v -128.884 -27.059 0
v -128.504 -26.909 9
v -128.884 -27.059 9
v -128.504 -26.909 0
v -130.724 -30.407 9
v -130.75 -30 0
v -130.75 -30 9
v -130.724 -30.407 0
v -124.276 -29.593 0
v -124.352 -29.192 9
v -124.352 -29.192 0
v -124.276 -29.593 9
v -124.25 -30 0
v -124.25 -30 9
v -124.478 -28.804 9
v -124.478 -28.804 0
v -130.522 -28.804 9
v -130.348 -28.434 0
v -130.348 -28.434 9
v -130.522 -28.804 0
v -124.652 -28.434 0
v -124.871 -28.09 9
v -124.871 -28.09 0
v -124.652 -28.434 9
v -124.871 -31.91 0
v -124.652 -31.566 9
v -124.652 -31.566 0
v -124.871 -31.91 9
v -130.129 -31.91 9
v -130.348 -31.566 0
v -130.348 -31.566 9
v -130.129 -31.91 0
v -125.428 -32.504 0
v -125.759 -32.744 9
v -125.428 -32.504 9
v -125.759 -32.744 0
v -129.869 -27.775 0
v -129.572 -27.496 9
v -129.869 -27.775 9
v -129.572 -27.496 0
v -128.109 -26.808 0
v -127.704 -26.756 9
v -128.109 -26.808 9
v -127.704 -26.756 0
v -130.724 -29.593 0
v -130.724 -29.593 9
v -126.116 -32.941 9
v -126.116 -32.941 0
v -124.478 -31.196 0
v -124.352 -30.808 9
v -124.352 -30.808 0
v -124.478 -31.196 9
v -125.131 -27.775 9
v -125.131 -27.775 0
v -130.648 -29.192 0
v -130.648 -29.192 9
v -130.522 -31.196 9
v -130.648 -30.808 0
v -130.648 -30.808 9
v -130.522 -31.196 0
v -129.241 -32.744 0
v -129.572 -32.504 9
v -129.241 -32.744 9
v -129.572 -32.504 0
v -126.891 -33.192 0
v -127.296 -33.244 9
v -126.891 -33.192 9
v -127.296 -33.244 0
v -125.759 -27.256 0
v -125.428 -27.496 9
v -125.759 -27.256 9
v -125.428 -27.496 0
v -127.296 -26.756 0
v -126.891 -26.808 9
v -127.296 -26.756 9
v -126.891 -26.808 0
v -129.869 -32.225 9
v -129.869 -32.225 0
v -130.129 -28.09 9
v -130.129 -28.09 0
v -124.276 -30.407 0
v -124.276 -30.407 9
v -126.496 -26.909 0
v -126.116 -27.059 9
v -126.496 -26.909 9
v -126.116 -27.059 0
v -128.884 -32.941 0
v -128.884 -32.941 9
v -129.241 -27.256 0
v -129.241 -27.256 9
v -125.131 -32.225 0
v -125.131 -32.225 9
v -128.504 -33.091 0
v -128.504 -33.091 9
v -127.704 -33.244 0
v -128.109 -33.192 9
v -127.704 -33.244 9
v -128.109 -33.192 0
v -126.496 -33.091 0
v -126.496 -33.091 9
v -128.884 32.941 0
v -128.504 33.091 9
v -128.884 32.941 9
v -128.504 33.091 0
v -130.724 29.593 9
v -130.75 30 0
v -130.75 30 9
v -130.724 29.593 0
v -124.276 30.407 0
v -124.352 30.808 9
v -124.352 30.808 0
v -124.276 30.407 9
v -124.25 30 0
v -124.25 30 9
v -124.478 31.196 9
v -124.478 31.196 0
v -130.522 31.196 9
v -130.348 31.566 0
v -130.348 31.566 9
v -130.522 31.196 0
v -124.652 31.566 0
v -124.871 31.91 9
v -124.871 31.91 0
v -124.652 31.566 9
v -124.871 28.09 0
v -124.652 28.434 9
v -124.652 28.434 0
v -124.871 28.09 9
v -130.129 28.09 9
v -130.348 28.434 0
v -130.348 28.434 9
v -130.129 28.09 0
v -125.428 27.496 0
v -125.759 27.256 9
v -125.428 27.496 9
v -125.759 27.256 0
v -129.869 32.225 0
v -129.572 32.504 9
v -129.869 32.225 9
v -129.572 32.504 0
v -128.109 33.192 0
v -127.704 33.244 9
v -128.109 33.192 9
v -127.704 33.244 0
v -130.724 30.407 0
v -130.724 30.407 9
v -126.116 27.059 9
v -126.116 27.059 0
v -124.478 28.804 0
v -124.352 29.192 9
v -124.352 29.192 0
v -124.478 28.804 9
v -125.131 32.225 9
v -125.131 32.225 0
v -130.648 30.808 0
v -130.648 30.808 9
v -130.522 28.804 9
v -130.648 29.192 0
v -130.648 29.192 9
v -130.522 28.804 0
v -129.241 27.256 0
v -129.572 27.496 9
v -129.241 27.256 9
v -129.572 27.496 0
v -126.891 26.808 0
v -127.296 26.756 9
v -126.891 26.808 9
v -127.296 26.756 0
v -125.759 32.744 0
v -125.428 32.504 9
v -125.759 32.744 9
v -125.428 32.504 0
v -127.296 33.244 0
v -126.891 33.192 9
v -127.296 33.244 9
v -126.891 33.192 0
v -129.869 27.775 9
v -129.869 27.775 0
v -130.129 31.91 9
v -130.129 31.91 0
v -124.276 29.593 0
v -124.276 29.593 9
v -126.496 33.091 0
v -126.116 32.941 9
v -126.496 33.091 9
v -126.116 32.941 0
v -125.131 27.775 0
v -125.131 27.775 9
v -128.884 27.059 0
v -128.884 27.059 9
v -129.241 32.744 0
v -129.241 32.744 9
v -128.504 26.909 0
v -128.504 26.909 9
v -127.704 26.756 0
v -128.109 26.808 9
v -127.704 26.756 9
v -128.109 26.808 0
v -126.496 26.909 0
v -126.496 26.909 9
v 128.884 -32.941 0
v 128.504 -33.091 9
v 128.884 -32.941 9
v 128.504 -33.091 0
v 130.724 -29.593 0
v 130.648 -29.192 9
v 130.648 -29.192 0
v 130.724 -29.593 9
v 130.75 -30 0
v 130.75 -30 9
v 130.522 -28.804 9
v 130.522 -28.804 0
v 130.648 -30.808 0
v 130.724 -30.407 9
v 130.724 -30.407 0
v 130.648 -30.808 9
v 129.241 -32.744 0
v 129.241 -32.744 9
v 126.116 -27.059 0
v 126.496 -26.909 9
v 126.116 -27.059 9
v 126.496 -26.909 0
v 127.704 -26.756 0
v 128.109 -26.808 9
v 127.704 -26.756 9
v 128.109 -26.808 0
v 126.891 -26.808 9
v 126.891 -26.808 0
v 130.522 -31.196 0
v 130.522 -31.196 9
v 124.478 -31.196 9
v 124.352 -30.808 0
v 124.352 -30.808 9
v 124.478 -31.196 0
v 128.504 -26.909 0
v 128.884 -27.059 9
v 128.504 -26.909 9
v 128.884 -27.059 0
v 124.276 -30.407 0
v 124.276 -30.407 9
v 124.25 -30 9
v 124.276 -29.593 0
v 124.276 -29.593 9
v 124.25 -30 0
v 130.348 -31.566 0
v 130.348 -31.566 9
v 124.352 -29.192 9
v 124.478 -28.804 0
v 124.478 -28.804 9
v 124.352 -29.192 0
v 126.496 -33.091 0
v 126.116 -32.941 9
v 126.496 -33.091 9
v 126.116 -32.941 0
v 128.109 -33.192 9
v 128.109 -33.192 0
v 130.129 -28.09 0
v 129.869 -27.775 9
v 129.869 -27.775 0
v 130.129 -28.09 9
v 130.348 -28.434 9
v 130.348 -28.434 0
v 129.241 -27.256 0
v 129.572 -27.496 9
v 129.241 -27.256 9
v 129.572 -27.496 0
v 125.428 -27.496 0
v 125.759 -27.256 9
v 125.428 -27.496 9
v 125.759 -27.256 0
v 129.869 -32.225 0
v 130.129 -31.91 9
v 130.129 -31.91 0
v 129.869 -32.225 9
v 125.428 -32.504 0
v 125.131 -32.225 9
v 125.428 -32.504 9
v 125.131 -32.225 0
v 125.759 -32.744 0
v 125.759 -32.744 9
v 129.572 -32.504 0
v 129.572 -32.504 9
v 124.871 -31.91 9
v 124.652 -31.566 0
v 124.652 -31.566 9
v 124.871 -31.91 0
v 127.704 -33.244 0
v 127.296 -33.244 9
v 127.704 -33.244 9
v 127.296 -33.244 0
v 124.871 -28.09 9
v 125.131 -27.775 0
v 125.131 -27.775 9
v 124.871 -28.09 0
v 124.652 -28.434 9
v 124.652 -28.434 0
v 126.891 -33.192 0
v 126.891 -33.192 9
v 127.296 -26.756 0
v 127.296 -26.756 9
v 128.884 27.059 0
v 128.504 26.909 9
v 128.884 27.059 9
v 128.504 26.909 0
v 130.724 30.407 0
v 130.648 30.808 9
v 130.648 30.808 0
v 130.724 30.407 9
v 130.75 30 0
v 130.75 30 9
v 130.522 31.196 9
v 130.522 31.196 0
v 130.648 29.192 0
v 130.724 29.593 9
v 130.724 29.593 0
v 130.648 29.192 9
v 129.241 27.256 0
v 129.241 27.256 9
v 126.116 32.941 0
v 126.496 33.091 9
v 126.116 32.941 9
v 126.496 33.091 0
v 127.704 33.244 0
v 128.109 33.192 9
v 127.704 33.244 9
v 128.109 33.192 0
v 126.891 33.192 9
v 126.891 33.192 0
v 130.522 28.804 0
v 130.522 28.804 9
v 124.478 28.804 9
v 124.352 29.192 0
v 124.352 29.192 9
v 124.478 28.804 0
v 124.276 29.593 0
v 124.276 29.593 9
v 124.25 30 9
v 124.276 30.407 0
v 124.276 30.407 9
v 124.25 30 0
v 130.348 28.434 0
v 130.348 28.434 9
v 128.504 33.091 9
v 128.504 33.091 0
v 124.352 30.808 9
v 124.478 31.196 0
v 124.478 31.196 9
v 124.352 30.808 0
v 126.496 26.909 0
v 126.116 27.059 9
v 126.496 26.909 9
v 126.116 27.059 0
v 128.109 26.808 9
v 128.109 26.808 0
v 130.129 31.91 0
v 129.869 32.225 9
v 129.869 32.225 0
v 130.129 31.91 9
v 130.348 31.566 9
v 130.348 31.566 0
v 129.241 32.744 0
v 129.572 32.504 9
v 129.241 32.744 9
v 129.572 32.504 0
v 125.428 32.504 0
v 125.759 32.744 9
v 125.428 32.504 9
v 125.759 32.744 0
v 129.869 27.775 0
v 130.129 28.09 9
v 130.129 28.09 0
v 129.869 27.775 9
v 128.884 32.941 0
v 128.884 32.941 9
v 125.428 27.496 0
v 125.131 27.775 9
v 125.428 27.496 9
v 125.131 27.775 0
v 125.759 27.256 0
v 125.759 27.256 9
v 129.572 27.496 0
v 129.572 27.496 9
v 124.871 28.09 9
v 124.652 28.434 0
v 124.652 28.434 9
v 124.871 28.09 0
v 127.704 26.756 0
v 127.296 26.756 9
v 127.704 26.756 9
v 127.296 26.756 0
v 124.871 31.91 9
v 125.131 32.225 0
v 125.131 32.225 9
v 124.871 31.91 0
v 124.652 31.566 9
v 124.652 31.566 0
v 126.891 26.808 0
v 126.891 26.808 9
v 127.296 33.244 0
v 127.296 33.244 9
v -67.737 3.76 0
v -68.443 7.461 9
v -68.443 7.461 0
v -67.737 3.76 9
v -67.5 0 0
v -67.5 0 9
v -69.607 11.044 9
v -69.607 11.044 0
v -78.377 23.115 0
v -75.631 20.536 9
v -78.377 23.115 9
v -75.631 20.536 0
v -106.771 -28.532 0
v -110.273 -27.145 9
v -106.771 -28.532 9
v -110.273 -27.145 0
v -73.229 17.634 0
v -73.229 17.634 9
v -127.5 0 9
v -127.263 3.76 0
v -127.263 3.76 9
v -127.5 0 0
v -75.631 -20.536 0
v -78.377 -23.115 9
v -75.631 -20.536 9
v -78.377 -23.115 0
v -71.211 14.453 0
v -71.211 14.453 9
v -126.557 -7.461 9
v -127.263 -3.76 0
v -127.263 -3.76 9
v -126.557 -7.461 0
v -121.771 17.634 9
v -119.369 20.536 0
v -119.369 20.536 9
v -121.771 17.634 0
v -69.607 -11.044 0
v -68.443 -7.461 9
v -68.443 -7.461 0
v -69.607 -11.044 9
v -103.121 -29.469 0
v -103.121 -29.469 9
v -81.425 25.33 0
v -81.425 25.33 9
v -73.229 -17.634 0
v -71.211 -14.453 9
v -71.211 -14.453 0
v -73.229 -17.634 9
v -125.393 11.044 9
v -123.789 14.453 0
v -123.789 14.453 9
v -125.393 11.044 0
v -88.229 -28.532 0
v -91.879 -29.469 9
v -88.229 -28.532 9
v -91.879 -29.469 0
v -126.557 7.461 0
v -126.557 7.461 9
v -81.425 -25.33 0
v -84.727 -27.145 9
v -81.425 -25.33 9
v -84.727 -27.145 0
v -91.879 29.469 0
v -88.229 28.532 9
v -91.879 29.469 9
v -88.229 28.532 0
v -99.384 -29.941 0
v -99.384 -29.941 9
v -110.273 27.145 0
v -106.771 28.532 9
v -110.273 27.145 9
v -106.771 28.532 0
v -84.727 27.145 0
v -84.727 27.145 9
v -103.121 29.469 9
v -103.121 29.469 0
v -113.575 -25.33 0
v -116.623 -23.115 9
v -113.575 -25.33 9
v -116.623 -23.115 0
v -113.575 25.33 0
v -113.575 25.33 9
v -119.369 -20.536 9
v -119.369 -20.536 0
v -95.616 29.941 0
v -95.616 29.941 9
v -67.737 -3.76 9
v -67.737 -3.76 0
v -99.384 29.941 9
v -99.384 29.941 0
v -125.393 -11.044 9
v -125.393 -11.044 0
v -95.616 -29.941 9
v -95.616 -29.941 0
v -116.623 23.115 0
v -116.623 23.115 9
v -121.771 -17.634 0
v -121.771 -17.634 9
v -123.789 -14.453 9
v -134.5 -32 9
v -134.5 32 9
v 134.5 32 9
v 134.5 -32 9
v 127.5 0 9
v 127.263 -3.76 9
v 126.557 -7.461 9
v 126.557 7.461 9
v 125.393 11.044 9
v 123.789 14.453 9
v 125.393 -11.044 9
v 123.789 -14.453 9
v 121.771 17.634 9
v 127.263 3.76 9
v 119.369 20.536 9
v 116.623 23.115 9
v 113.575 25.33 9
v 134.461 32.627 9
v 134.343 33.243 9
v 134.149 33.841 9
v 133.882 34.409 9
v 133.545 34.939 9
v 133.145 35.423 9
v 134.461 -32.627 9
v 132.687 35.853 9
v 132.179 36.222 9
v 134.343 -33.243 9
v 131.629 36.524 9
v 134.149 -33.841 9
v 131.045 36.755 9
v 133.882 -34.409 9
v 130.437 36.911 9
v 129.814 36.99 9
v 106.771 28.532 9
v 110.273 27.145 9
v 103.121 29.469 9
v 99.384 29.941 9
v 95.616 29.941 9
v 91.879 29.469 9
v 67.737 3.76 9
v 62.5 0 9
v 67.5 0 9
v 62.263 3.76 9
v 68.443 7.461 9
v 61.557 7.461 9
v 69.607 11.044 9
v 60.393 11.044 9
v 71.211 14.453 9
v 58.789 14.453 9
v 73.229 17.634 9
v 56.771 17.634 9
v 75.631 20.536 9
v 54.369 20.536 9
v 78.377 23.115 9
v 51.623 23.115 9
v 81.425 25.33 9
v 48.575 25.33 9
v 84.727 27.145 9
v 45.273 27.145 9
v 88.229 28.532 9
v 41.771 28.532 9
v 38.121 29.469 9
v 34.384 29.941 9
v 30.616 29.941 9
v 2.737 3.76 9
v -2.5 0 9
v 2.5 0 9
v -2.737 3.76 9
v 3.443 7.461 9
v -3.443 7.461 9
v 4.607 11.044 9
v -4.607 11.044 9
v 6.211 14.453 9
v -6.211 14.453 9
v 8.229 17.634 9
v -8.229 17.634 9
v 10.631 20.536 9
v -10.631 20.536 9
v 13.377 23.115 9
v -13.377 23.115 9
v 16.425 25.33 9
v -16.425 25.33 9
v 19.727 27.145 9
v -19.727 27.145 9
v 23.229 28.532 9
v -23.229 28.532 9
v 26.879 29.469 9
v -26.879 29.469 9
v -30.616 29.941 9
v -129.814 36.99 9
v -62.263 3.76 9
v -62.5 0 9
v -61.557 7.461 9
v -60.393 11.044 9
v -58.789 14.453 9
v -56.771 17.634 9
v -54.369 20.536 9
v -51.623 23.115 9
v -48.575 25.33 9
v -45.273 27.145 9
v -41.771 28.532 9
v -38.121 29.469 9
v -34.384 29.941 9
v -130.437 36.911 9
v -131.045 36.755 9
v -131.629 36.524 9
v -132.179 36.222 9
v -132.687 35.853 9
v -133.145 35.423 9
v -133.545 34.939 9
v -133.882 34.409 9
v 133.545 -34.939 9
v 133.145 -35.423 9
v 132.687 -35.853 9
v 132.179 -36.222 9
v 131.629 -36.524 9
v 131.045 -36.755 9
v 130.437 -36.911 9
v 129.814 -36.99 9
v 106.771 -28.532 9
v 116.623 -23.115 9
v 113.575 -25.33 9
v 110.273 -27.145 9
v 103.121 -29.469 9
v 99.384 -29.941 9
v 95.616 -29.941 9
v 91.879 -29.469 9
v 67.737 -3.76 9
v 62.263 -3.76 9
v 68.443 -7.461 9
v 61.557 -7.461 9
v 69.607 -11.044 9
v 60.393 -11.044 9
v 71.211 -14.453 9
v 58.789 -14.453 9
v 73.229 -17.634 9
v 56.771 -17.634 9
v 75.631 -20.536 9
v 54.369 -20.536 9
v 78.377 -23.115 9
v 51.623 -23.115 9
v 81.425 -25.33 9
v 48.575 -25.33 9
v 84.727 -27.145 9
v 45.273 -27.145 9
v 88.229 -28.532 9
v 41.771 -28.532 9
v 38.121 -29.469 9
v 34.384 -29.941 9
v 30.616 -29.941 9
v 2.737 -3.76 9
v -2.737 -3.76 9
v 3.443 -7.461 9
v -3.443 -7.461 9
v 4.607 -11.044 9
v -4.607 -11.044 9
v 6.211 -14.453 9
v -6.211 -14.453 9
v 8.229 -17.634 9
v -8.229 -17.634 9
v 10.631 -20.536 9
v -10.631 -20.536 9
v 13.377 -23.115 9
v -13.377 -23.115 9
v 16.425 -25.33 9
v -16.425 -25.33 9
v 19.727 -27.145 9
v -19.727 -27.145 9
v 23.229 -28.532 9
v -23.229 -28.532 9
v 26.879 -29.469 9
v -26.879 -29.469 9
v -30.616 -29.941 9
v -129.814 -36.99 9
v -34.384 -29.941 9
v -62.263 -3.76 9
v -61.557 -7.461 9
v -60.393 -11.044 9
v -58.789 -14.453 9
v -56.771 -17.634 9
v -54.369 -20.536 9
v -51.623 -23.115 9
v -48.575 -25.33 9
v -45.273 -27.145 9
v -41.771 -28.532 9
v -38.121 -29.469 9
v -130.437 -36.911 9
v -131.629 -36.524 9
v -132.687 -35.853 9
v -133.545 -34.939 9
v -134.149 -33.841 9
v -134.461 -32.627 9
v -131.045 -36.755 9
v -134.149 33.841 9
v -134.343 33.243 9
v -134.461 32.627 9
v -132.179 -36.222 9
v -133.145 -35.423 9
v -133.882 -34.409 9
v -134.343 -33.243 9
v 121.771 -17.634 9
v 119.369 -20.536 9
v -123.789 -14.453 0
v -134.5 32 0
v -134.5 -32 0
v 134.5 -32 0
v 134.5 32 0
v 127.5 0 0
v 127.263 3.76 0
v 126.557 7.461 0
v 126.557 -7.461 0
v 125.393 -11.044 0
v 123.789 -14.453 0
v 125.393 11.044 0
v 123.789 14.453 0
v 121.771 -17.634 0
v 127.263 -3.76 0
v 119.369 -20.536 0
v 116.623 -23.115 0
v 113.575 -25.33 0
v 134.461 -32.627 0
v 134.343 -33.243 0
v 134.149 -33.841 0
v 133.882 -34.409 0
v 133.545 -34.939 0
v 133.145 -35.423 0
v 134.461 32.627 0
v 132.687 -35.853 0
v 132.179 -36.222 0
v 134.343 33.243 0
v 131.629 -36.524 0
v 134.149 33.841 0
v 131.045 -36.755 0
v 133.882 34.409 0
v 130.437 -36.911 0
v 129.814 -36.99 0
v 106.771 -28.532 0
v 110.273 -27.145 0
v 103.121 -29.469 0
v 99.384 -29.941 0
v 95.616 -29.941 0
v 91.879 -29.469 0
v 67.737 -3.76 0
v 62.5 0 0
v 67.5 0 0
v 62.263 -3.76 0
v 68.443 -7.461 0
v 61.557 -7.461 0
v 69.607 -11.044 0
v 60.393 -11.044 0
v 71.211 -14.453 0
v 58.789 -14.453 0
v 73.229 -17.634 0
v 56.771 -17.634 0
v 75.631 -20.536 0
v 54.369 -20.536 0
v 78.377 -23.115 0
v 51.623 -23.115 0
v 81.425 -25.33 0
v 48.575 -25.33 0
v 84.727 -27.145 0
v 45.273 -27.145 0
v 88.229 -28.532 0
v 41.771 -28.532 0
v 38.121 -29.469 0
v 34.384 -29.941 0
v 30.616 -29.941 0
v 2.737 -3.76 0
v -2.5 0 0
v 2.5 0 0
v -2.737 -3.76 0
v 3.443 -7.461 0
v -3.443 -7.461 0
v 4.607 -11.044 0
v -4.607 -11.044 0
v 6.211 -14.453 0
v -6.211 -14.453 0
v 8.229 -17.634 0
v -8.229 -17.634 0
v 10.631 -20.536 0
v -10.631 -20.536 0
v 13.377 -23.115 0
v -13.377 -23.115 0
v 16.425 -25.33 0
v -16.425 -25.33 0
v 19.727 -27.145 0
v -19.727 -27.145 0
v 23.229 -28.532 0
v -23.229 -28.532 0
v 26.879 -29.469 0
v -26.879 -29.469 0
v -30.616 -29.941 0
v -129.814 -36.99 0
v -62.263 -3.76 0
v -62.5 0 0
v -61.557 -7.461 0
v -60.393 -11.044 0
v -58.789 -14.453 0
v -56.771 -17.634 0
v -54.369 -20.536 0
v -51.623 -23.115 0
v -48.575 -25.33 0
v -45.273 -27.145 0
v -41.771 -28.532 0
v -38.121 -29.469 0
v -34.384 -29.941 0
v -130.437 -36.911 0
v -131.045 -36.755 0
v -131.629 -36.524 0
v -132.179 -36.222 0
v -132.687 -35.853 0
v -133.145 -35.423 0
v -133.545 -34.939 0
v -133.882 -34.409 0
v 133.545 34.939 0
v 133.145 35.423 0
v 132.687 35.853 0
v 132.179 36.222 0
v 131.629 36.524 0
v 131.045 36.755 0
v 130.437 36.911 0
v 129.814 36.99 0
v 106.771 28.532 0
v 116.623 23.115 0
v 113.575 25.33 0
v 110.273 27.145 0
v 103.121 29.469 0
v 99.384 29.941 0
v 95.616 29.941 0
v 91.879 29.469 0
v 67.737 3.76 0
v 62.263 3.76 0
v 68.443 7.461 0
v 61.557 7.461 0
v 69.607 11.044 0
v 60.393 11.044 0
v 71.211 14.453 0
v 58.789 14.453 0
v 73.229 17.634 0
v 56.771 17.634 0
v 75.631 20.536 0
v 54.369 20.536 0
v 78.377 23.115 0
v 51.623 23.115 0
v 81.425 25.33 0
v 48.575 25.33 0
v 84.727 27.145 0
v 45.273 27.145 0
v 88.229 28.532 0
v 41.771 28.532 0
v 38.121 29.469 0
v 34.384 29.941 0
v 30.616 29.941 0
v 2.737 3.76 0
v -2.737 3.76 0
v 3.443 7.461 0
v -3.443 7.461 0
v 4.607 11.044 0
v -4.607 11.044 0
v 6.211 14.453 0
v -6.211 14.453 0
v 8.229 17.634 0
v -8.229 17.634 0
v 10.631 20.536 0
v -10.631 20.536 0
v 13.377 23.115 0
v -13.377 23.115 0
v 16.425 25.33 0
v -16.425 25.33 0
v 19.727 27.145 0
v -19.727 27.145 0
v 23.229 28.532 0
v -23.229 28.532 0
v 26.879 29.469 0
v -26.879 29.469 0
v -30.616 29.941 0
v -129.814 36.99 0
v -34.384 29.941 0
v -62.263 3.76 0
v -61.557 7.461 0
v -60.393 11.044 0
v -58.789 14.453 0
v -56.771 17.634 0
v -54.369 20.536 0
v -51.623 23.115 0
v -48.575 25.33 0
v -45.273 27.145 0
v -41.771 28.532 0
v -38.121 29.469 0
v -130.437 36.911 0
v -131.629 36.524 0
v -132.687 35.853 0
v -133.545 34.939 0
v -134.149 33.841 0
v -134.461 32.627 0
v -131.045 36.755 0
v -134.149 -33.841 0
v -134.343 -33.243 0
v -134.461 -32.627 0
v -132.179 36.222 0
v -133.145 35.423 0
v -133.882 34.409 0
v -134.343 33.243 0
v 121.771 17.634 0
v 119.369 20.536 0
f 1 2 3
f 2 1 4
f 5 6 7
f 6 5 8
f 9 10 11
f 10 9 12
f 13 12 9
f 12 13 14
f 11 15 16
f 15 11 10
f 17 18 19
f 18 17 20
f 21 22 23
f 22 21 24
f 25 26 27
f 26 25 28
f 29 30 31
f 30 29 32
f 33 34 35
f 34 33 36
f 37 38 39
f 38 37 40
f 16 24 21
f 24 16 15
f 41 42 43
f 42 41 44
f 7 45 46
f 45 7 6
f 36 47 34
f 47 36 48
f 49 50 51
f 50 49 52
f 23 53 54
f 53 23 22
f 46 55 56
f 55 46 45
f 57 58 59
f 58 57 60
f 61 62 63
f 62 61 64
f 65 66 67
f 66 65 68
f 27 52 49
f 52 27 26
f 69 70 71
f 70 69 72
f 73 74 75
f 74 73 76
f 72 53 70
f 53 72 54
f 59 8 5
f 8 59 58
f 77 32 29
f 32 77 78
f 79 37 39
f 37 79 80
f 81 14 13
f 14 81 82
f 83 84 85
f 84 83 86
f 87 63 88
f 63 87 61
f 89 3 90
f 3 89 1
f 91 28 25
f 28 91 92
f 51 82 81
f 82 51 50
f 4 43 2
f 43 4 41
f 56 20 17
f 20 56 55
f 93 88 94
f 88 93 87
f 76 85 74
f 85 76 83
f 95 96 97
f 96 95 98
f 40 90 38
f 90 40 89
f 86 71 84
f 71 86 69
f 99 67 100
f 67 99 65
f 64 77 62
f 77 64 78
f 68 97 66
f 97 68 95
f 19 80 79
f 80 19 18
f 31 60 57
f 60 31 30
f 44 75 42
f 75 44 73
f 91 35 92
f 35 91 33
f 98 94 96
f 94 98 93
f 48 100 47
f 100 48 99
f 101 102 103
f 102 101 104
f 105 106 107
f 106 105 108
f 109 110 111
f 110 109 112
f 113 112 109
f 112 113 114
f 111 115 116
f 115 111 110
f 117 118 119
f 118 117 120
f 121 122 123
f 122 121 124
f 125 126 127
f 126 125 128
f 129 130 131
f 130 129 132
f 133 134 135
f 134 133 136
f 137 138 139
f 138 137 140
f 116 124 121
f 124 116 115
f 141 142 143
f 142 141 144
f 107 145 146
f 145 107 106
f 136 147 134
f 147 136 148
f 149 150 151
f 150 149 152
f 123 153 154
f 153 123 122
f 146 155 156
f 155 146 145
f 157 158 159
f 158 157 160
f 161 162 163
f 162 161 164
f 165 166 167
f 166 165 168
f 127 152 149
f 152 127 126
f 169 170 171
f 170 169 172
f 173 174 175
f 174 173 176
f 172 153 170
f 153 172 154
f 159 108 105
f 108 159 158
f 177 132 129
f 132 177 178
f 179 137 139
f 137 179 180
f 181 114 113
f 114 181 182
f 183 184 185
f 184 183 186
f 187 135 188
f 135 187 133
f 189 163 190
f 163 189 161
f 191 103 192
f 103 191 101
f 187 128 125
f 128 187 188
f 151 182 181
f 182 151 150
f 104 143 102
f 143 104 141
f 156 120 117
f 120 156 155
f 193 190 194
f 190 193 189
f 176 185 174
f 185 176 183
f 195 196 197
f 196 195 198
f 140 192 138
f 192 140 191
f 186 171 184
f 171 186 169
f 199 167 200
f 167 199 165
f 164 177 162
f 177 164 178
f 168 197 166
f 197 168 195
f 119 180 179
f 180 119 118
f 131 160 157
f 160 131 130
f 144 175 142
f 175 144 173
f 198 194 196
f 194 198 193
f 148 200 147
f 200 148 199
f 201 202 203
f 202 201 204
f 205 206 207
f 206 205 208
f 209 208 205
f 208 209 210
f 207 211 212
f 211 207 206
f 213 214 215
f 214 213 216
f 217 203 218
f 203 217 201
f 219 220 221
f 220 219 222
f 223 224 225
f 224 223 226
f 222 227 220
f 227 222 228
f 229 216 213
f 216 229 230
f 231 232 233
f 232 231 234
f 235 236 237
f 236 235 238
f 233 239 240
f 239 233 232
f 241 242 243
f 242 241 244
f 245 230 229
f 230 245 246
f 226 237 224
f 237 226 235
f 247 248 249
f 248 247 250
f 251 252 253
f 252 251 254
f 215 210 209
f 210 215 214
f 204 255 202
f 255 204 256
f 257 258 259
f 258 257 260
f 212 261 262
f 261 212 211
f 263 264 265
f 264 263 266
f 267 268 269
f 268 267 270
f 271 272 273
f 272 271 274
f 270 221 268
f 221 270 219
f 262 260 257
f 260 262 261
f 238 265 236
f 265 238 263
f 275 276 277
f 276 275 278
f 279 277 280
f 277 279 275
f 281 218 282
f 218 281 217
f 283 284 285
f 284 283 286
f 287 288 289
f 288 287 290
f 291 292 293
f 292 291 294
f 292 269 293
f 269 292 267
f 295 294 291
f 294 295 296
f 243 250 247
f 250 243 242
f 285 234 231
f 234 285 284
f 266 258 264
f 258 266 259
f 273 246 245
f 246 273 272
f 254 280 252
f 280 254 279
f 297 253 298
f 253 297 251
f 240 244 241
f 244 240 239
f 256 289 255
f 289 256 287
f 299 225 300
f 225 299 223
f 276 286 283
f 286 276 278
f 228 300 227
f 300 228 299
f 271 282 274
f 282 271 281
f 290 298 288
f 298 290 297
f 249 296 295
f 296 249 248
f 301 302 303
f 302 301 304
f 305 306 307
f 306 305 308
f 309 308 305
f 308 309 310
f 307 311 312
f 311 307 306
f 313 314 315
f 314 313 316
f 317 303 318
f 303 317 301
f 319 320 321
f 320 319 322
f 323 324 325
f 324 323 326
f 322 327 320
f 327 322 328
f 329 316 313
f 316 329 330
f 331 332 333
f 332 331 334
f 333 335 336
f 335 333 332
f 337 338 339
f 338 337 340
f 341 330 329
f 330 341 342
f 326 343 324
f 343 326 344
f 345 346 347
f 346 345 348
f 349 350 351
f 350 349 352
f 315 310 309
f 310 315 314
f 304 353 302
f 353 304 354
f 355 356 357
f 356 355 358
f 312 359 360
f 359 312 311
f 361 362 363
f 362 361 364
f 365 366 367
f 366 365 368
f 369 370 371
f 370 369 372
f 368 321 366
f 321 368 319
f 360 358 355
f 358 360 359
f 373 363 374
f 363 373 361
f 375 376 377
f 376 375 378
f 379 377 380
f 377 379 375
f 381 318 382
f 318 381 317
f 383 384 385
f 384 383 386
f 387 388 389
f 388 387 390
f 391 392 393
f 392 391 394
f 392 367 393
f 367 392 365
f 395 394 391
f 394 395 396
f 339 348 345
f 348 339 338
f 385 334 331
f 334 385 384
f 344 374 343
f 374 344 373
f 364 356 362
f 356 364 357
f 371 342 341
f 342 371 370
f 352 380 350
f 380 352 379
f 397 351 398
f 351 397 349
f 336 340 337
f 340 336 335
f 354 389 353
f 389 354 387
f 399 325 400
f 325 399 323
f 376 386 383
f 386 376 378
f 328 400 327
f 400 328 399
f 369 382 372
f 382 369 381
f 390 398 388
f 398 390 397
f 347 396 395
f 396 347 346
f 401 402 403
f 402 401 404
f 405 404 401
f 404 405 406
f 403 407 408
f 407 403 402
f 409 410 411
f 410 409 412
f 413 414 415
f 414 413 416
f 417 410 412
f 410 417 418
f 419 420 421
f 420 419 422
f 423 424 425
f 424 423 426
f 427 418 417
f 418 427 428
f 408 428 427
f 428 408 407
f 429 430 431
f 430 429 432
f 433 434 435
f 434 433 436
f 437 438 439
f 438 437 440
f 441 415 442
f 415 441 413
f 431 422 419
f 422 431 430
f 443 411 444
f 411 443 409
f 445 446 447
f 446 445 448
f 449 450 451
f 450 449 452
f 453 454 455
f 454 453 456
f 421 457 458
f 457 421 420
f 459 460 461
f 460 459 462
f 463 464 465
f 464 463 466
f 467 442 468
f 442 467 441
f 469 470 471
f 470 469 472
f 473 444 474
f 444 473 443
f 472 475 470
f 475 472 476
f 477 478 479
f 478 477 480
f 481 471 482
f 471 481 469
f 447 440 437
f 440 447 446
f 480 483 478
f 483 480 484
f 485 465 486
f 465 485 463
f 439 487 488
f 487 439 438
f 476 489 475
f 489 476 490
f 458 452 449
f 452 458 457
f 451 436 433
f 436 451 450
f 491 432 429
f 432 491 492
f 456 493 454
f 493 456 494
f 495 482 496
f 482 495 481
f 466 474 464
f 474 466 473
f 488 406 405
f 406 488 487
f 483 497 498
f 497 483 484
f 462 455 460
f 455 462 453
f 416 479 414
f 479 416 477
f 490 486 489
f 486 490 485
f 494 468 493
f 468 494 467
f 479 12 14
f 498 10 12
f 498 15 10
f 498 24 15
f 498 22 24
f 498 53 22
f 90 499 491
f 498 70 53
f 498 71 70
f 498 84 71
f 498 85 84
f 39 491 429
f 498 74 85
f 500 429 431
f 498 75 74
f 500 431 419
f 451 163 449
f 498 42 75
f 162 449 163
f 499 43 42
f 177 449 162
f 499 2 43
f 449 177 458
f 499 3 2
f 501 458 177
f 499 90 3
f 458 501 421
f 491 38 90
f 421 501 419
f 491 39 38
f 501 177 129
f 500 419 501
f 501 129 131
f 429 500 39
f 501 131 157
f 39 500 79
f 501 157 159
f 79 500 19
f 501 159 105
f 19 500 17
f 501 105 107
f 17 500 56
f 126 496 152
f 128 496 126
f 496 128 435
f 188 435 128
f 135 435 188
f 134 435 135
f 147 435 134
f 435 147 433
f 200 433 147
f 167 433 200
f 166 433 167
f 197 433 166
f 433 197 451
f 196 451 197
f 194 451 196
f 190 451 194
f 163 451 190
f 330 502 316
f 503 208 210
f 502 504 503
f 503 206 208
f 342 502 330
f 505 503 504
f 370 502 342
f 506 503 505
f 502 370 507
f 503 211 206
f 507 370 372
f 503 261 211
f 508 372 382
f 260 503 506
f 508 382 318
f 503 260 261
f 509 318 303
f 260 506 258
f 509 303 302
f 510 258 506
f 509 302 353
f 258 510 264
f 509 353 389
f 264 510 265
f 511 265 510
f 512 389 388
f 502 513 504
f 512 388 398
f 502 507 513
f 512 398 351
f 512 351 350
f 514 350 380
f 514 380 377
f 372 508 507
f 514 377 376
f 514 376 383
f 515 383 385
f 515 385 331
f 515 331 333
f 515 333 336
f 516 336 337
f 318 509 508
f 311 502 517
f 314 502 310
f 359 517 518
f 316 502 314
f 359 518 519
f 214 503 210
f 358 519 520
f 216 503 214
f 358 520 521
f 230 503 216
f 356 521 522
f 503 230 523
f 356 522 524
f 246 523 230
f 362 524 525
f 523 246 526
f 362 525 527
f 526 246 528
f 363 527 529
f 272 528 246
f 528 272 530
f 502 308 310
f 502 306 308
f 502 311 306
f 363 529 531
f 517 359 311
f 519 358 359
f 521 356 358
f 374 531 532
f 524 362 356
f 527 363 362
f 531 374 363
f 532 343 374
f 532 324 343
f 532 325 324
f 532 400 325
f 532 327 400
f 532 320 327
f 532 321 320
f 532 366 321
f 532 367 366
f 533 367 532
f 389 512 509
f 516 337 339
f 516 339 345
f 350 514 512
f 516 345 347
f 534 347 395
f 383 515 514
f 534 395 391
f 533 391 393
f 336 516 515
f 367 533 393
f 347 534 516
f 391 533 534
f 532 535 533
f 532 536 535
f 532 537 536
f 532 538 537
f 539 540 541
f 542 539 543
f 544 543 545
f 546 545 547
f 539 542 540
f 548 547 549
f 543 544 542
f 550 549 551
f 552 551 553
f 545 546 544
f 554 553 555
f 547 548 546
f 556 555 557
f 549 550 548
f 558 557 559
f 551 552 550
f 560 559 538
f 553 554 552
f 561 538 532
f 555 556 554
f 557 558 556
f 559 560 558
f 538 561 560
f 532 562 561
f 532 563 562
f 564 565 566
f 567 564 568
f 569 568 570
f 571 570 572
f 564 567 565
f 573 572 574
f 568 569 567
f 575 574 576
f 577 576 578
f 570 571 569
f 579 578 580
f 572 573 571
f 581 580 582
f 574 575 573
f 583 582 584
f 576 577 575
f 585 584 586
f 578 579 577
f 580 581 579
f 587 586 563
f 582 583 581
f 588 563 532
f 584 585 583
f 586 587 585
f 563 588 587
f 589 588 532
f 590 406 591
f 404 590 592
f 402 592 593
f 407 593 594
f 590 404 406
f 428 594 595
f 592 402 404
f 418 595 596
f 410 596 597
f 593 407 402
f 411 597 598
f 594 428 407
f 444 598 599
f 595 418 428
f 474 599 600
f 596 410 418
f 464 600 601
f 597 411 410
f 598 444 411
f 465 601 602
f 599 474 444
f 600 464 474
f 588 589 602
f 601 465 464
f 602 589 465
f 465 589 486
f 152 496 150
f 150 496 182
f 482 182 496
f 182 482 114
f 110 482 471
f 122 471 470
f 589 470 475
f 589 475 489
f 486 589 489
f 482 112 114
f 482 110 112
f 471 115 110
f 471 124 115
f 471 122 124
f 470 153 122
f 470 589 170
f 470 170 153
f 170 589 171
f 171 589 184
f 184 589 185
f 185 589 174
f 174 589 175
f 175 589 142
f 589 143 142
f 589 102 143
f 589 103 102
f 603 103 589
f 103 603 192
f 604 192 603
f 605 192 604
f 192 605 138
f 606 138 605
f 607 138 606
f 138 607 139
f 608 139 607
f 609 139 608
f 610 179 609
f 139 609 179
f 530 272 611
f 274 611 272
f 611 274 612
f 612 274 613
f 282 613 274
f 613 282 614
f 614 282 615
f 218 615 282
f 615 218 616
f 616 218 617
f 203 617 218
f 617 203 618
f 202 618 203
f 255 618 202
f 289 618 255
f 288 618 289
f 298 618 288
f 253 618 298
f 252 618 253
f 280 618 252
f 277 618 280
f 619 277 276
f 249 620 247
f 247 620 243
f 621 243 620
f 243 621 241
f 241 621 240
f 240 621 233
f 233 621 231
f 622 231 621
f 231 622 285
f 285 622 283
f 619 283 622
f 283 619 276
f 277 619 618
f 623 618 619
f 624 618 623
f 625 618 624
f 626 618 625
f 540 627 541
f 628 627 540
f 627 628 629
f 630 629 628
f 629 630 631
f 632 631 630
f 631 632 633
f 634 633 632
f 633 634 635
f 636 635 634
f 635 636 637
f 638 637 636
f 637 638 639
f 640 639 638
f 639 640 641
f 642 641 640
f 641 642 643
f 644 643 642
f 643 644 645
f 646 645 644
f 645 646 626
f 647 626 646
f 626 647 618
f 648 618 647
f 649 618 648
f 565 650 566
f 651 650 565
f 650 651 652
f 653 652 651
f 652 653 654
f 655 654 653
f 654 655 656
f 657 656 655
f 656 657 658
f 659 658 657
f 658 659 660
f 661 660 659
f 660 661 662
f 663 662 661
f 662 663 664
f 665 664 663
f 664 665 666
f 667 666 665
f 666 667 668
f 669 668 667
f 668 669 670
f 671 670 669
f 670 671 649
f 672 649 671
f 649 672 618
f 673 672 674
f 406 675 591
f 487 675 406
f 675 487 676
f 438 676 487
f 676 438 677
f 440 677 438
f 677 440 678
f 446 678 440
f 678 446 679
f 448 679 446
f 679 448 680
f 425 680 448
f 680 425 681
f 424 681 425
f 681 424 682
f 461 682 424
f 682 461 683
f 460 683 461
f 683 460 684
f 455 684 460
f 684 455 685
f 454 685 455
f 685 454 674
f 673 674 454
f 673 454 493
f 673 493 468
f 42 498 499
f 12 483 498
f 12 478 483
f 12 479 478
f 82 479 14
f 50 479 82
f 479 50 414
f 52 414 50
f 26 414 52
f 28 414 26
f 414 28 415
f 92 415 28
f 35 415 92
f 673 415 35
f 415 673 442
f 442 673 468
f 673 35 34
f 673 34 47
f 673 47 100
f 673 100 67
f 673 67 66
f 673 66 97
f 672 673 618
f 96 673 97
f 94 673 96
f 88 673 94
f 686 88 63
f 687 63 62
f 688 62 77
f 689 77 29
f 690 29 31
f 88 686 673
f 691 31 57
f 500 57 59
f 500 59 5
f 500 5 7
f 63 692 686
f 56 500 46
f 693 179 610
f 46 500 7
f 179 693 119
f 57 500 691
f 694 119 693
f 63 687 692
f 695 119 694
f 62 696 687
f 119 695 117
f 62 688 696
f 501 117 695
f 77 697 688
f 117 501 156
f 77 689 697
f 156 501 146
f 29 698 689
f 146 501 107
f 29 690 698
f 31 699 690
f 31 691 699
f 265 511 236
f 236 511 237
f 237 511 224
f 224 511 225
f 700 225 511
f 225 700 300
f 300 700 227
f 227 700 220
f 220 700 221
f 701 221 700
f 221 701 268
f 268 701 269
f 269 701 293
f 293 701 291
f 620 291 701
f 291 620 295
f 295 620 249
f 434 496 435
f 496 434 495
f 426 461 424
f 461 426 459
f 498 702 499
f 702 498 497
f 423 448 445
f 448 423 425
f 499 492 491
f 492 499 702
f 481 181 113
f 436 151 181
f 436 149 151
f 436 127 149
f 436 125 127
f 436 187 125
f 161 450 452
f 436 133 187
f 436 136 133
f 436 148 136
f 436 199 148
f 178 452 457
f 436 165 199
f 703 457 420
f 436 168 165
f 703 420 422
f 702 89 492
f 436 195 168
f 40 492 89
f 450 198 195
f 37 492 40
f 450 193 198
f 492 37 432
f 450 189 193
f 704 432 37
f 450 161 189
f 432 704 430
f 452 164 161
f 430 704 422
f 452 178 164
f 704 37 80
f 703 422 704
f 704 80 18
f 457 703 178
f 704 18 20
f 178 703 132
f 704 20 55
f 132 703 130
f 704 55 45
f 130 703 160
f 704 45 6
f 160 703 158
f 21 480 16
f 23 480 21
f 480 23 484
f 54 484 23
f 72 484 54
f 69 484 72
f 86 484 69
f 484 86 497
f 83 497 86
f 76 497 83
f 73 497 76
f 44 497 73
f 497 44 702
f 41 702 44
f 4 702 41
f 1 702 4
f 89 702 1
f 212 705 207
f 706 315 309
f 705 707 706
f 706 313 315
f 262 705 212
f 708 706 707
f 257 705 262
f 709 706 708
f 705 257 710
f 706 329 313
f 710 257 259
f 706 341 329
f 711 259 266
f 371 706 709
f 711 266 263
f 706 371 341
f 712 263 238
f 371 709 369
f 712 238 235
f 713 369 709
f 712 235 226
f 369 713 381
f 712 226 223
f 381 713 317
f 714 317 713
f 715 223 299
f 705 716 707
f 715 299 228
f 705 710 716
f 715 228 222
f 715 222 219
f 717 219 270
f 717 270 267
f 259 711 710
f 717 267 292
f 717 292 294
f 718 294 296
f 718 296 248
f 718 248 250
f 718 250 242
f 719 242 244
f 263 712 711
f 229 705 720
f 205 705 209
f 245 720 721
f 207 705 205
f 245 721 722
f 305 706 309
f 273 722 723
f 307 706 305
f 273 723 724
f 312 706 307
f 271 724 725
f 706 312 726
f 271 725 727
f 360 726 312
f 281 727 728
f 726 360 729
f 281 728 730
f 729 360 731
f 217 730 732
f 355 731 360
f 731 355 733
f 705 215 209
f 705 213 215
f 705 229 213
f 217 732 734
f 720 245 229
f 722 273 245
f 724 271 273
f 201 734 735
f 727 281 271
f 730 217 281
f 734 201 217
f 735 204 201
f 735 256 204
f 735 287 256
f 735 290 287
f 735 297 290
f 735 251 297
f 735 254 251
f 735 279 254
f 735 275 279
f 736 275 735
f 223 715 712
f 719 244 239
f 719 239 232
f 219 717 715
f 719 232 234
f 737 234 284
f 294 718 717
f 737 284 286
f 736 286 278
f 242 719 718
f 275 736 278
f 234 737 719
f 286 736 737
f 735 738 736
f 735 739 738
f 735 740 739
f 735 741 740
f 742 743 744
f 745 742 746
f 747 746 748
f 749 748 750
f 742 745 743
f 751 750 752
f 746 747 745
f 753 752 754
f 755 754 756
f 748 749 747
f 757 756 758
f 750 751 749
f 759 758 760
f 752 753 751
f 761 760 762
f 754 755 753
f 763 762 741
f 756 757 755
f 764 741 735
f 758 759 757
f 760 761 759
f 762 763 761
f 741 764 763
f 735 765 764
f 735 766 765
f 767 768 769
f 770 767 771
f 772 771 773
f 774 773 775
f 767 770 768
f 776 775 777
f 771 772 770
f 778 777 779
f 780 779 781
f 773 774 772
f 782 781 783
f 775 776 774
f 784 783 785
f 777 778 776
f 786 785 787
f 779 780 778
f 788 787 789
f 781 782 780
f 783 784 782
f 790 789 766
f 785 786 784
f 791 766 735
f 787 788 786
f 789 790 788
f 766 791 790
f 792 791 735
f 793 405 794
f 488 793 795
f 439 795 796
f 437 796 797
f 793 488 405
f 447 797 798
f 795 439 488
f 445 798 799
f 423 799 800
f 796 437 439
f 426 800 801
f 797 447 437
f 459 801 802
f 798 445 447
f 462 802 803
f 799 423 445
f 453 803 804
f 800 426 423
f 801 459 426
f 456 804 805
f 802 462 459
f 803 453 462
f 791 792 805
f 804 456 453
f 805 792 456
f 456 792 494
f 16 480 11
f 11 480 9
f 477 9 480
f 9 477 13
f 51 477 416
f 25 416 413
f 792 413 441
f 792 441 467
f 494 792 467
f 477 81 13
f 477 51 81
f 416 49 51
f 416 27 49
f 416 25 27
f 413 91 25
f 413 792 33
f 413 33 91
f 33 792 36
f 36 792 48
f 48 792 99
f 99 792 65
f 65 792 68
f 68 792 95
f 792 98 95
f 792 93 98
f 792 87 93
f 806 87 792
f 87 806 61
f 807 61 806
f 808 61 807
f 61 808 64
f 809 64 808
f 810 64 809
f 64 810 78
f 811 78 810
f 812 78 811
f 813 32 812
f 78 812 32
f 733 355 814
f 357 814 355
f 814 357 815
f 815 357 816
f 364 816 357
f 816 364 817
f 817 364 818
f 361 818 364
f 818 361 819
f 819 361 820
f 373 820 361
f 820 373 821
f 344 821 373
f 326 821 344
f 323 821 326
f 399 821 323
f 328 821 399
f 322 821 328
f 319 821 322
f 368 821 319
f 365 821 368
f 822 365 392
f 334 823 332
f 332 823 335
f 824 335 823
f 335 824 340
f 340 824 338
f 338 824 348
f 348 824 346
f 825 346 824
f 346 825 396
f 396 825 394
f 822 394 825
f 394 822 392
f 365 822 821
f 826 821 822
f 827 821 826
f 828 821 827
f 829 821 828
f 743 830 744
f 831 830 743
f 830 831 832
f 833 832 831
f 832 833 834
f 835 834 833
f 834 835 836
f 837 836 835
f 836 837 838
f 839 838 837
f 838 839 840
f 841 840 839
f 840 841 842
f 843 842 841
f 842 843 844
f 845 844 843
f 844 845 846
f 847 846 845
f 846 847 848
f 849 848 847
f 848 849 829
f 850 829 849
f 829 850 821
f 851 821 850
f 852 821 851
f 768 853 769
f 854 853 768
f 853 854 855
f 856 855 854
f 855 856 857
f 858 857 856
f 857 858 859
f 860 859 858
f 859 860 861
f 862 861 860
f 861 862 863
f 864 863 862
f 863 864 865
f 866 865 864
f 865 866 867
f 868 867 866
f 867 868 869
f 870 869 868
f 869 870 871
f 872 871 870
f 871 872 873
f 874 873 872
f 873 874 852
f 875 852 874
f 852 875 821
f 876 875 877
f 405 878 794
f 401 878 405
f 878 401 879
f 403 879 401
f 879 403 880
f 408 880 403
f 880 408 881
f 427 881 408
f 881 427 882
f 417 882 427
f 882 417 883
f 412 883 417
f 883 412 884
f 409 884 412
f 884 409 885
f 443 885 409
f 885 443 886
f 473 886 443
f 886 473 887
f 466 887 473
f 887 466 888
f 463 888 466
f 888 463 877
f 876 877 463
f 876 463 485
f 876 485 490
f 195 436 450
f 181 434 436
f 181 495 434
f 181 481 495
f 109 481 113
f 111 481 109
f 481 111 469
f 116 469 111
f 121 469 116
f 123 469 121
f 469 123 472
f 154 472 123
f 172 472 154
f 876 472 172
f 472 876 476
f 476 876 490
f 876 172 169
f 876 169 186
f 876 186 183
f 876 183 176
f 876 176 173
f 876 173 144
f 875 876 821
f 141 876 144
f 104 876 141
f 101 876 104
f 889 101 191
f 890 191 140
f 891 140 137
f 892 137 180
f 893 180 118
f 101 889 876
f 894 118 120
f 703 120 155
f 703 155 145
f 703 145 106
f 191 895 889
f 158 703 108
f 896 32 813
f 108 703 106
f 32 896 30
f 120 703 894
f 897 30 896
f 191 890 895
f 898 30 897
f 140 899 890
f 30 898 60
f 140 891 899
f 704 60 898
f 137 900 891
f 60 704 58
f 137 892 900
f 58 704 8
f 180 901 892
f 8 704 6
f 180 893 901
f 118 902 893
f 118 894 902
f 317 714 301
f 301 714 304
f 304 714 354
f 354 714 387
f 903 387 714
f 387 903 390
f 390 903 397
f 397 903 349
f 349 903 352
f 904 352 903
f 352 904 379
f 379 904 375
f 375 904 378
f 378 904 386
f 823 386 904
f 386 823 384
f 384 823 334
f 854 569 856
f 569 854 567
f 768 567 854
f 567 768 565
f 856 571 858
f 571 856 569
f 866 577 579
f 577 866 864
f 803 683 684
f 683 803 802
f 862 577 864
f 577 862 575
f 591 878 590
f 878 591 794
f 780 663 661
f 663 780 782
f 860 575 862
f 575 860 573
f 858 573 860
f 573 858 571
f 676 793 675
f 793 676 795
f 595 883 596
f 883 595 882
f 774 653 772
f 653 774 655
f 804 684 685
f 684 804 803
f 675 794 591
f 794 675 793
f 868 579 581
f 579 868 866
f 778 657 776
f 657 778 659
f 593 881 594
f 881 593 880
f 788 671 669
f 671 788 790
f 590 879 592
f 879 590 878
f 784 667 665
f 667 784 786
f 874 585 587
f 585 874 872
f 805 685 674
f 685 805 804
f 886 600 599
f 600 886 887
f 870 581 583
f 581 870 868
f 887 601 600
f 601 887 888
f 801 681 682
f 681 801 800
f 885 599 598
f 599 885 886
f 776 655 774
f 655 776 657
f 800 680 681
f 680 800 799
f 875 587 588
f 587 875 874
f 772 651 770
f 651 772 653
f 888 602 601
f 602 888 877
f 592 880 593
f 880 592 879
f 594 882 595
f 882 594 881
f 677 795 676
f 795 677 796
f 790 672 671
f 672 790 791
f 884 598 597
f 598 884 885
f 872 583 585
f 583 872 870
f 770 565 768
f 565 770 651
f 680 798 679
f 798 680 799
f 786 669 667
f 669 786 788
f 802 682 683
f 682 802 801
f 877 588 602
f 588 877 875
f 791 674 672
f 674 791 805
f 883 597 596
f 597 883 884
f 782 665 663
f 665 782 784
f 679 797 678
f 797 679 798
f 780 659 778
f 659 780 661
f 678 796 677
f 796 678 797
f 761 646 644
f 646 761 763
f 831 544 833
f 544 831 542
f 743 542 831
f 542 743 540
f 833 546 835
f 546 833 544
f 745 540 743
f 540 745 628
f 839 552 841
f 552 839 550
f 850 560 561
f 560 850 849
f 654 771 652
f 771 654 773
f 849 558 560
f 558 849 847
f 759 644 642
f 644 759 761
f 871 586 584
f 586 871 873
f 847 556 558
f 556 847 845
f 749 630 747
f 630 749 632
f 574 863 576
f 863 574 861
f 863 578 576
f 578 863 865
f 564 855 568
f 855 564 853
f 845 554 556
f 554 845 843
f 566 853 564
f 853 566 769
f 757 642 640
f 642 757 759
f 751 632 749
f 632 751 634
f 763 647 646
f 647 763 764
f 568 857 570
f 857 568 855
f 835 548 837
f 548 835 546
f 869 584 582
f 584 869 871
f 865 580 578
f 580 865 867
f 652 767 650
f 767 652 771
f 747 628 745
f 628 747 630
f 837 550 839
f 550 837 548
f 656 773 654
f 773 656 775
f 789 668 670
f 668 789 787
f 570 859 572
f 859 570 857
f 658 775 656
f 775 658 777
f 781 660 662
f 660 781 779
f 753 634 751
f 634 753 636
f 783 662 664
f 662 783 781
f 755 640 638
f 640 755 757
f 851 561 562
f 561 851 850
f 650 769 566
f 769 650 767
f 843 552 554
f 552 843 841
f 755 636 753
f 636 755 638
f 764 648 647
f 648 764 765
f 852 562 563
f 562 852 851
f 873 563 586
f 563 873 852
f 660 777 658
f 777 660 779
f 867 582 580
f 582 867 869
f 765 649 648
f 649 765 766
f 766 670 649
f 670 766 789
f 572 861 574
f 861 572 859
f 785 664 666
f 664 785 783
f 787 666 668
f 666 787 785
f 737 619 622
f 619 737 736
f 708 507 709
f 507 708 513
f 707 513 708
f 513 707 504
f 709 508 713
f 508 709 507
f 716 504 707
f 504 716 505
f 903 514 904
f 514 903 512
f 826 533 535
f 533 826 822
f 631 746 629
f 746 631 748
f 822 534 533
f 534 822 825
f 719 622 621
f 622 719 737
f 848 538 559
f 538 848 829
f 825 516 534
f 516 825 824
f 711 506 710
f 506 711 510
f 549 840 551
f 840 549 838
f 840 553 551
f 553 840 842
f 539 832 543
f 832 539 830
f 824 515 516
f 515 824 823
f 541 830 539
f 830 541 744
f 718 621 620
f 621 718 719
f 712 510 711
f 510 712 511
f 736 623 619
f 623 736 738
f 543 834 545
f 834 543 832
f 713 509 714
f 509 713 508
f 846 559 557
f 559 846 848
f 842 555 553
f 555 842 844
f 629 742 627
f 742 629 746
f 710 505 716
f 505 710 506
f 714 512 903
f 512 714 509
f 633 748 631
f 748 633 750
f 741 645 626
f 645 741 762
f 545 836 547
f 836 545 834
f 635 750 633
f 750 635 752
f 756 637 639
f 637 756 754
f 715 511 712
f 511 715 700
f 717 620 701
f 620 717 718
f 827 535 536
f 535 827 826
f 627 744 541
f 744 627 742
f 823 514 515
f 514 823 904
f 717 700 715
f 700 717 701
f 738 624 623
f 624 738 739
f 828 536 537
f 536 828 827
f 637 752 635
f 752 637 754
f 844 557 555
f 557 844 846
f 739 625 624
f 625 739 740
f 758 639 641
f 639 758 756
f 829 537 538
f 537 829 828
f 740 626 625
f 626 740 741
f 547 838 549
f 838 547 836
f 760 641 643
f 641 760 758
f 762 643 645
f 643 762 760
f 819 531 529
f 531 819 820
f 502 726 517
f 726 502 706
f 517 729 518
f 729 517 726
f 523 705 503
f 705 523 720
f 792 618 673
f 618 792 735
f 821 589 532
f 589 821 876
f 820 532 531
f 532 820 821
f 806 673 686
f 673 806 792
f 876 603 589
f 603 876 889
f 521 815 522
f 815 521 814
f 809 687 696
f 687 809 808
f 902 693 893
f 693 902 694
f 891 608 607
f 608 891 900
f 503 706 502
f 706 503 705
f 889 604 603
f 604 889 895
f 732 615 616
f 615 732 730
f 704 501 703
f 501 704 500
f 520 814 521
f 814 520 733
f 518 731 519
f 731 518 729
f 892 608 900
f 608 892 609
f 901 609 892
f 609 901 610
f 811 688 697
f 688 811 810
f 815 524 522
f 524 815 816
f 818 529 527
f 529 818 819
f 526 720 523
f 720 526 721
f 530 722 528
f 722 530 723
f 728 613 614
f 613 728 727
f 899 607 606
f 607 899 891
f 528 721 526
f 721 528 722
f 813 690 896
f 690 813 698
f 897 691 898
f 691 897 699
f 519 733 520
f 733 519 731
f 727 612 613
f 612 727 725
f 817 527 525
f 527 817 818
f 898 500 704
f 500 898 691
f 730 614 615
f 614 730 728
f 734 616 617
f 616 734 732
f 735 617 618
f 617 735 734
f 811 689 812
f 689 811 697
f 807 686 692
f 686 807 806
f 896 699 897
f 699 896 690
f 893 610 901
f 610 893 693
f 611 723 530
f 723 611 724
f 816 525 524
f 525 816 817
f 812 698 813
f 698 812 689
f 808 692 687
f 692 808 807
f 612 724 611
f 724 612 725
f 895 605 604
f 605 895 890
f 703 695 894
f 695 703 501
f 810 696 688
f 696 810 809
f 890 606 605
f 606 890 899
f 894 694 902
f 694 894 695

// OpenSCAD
$fn = 50;

difference() {
	union() {
		hull() {
			translate(v = [-129.5, 32.0, 0]) {
				cylinder(h = 9, r = 5);
			}
			translate(v = [129.5, 32.0, 0]) {
				cylinder(h = 9, r = 5);
			}
			translate(v = [-129.5, -32.0, 0]) {
				cylinder(h = 9, r = 5);
			}
			translate(v = [129.5, -32.0, 0]) {
				cylinder(h = 9, r = 5);
			}
		}
	}
	union() {
		translate(v = [-127.5, -30.0, -100.0]) {
			cylinder(h = 200, r = 3.25);
		}
		translate(v = [-127.5, 30.0, -100.0]) {
			cylinder(h = 200, r = 3.25);
		}
		translate(v = [127.5, -30.0, -100.0]) {
			cylinder(h = 200, r = 3.25);
		}
		translate(v = [127.5, 30.0, -100.0]) {
			cylinder(h = 200, r = 3.25);
		}
		translate(v = [-127.5, -30.0, -100.0]) {
			cylinder(h = 200, r = 1.8);
		}
		translate(v = [-127.5, 30.0, -100.0]) {
			cylinder(h = 200, r = 1.8);
		}
		translate(v = [127.5, -30.0, -100.0]) {
			cylinder(h = 200, r = 1.8);
		}
		translate(v = [127.5, 30.0, -100.0]) {
			cylinder(h = 200, r = 1.8);
		}
		translate(v = [-97.5, 0, 0.0]) {
			cylinder(h = 9, r = 30.0);
		}
		translate(v = [-32.5, 0, 0.0]) {
			cylinder(h = 9, r = 30.0);
		}
		translate(v = [32.5, 0, 0.0]) {
			cylinder(h = 9, r = 30.0);
		}
		translate(v = [97.5, 0, 0.0]) {
			cylinder(h = 9, r = 30.0);
		}
	}
}
